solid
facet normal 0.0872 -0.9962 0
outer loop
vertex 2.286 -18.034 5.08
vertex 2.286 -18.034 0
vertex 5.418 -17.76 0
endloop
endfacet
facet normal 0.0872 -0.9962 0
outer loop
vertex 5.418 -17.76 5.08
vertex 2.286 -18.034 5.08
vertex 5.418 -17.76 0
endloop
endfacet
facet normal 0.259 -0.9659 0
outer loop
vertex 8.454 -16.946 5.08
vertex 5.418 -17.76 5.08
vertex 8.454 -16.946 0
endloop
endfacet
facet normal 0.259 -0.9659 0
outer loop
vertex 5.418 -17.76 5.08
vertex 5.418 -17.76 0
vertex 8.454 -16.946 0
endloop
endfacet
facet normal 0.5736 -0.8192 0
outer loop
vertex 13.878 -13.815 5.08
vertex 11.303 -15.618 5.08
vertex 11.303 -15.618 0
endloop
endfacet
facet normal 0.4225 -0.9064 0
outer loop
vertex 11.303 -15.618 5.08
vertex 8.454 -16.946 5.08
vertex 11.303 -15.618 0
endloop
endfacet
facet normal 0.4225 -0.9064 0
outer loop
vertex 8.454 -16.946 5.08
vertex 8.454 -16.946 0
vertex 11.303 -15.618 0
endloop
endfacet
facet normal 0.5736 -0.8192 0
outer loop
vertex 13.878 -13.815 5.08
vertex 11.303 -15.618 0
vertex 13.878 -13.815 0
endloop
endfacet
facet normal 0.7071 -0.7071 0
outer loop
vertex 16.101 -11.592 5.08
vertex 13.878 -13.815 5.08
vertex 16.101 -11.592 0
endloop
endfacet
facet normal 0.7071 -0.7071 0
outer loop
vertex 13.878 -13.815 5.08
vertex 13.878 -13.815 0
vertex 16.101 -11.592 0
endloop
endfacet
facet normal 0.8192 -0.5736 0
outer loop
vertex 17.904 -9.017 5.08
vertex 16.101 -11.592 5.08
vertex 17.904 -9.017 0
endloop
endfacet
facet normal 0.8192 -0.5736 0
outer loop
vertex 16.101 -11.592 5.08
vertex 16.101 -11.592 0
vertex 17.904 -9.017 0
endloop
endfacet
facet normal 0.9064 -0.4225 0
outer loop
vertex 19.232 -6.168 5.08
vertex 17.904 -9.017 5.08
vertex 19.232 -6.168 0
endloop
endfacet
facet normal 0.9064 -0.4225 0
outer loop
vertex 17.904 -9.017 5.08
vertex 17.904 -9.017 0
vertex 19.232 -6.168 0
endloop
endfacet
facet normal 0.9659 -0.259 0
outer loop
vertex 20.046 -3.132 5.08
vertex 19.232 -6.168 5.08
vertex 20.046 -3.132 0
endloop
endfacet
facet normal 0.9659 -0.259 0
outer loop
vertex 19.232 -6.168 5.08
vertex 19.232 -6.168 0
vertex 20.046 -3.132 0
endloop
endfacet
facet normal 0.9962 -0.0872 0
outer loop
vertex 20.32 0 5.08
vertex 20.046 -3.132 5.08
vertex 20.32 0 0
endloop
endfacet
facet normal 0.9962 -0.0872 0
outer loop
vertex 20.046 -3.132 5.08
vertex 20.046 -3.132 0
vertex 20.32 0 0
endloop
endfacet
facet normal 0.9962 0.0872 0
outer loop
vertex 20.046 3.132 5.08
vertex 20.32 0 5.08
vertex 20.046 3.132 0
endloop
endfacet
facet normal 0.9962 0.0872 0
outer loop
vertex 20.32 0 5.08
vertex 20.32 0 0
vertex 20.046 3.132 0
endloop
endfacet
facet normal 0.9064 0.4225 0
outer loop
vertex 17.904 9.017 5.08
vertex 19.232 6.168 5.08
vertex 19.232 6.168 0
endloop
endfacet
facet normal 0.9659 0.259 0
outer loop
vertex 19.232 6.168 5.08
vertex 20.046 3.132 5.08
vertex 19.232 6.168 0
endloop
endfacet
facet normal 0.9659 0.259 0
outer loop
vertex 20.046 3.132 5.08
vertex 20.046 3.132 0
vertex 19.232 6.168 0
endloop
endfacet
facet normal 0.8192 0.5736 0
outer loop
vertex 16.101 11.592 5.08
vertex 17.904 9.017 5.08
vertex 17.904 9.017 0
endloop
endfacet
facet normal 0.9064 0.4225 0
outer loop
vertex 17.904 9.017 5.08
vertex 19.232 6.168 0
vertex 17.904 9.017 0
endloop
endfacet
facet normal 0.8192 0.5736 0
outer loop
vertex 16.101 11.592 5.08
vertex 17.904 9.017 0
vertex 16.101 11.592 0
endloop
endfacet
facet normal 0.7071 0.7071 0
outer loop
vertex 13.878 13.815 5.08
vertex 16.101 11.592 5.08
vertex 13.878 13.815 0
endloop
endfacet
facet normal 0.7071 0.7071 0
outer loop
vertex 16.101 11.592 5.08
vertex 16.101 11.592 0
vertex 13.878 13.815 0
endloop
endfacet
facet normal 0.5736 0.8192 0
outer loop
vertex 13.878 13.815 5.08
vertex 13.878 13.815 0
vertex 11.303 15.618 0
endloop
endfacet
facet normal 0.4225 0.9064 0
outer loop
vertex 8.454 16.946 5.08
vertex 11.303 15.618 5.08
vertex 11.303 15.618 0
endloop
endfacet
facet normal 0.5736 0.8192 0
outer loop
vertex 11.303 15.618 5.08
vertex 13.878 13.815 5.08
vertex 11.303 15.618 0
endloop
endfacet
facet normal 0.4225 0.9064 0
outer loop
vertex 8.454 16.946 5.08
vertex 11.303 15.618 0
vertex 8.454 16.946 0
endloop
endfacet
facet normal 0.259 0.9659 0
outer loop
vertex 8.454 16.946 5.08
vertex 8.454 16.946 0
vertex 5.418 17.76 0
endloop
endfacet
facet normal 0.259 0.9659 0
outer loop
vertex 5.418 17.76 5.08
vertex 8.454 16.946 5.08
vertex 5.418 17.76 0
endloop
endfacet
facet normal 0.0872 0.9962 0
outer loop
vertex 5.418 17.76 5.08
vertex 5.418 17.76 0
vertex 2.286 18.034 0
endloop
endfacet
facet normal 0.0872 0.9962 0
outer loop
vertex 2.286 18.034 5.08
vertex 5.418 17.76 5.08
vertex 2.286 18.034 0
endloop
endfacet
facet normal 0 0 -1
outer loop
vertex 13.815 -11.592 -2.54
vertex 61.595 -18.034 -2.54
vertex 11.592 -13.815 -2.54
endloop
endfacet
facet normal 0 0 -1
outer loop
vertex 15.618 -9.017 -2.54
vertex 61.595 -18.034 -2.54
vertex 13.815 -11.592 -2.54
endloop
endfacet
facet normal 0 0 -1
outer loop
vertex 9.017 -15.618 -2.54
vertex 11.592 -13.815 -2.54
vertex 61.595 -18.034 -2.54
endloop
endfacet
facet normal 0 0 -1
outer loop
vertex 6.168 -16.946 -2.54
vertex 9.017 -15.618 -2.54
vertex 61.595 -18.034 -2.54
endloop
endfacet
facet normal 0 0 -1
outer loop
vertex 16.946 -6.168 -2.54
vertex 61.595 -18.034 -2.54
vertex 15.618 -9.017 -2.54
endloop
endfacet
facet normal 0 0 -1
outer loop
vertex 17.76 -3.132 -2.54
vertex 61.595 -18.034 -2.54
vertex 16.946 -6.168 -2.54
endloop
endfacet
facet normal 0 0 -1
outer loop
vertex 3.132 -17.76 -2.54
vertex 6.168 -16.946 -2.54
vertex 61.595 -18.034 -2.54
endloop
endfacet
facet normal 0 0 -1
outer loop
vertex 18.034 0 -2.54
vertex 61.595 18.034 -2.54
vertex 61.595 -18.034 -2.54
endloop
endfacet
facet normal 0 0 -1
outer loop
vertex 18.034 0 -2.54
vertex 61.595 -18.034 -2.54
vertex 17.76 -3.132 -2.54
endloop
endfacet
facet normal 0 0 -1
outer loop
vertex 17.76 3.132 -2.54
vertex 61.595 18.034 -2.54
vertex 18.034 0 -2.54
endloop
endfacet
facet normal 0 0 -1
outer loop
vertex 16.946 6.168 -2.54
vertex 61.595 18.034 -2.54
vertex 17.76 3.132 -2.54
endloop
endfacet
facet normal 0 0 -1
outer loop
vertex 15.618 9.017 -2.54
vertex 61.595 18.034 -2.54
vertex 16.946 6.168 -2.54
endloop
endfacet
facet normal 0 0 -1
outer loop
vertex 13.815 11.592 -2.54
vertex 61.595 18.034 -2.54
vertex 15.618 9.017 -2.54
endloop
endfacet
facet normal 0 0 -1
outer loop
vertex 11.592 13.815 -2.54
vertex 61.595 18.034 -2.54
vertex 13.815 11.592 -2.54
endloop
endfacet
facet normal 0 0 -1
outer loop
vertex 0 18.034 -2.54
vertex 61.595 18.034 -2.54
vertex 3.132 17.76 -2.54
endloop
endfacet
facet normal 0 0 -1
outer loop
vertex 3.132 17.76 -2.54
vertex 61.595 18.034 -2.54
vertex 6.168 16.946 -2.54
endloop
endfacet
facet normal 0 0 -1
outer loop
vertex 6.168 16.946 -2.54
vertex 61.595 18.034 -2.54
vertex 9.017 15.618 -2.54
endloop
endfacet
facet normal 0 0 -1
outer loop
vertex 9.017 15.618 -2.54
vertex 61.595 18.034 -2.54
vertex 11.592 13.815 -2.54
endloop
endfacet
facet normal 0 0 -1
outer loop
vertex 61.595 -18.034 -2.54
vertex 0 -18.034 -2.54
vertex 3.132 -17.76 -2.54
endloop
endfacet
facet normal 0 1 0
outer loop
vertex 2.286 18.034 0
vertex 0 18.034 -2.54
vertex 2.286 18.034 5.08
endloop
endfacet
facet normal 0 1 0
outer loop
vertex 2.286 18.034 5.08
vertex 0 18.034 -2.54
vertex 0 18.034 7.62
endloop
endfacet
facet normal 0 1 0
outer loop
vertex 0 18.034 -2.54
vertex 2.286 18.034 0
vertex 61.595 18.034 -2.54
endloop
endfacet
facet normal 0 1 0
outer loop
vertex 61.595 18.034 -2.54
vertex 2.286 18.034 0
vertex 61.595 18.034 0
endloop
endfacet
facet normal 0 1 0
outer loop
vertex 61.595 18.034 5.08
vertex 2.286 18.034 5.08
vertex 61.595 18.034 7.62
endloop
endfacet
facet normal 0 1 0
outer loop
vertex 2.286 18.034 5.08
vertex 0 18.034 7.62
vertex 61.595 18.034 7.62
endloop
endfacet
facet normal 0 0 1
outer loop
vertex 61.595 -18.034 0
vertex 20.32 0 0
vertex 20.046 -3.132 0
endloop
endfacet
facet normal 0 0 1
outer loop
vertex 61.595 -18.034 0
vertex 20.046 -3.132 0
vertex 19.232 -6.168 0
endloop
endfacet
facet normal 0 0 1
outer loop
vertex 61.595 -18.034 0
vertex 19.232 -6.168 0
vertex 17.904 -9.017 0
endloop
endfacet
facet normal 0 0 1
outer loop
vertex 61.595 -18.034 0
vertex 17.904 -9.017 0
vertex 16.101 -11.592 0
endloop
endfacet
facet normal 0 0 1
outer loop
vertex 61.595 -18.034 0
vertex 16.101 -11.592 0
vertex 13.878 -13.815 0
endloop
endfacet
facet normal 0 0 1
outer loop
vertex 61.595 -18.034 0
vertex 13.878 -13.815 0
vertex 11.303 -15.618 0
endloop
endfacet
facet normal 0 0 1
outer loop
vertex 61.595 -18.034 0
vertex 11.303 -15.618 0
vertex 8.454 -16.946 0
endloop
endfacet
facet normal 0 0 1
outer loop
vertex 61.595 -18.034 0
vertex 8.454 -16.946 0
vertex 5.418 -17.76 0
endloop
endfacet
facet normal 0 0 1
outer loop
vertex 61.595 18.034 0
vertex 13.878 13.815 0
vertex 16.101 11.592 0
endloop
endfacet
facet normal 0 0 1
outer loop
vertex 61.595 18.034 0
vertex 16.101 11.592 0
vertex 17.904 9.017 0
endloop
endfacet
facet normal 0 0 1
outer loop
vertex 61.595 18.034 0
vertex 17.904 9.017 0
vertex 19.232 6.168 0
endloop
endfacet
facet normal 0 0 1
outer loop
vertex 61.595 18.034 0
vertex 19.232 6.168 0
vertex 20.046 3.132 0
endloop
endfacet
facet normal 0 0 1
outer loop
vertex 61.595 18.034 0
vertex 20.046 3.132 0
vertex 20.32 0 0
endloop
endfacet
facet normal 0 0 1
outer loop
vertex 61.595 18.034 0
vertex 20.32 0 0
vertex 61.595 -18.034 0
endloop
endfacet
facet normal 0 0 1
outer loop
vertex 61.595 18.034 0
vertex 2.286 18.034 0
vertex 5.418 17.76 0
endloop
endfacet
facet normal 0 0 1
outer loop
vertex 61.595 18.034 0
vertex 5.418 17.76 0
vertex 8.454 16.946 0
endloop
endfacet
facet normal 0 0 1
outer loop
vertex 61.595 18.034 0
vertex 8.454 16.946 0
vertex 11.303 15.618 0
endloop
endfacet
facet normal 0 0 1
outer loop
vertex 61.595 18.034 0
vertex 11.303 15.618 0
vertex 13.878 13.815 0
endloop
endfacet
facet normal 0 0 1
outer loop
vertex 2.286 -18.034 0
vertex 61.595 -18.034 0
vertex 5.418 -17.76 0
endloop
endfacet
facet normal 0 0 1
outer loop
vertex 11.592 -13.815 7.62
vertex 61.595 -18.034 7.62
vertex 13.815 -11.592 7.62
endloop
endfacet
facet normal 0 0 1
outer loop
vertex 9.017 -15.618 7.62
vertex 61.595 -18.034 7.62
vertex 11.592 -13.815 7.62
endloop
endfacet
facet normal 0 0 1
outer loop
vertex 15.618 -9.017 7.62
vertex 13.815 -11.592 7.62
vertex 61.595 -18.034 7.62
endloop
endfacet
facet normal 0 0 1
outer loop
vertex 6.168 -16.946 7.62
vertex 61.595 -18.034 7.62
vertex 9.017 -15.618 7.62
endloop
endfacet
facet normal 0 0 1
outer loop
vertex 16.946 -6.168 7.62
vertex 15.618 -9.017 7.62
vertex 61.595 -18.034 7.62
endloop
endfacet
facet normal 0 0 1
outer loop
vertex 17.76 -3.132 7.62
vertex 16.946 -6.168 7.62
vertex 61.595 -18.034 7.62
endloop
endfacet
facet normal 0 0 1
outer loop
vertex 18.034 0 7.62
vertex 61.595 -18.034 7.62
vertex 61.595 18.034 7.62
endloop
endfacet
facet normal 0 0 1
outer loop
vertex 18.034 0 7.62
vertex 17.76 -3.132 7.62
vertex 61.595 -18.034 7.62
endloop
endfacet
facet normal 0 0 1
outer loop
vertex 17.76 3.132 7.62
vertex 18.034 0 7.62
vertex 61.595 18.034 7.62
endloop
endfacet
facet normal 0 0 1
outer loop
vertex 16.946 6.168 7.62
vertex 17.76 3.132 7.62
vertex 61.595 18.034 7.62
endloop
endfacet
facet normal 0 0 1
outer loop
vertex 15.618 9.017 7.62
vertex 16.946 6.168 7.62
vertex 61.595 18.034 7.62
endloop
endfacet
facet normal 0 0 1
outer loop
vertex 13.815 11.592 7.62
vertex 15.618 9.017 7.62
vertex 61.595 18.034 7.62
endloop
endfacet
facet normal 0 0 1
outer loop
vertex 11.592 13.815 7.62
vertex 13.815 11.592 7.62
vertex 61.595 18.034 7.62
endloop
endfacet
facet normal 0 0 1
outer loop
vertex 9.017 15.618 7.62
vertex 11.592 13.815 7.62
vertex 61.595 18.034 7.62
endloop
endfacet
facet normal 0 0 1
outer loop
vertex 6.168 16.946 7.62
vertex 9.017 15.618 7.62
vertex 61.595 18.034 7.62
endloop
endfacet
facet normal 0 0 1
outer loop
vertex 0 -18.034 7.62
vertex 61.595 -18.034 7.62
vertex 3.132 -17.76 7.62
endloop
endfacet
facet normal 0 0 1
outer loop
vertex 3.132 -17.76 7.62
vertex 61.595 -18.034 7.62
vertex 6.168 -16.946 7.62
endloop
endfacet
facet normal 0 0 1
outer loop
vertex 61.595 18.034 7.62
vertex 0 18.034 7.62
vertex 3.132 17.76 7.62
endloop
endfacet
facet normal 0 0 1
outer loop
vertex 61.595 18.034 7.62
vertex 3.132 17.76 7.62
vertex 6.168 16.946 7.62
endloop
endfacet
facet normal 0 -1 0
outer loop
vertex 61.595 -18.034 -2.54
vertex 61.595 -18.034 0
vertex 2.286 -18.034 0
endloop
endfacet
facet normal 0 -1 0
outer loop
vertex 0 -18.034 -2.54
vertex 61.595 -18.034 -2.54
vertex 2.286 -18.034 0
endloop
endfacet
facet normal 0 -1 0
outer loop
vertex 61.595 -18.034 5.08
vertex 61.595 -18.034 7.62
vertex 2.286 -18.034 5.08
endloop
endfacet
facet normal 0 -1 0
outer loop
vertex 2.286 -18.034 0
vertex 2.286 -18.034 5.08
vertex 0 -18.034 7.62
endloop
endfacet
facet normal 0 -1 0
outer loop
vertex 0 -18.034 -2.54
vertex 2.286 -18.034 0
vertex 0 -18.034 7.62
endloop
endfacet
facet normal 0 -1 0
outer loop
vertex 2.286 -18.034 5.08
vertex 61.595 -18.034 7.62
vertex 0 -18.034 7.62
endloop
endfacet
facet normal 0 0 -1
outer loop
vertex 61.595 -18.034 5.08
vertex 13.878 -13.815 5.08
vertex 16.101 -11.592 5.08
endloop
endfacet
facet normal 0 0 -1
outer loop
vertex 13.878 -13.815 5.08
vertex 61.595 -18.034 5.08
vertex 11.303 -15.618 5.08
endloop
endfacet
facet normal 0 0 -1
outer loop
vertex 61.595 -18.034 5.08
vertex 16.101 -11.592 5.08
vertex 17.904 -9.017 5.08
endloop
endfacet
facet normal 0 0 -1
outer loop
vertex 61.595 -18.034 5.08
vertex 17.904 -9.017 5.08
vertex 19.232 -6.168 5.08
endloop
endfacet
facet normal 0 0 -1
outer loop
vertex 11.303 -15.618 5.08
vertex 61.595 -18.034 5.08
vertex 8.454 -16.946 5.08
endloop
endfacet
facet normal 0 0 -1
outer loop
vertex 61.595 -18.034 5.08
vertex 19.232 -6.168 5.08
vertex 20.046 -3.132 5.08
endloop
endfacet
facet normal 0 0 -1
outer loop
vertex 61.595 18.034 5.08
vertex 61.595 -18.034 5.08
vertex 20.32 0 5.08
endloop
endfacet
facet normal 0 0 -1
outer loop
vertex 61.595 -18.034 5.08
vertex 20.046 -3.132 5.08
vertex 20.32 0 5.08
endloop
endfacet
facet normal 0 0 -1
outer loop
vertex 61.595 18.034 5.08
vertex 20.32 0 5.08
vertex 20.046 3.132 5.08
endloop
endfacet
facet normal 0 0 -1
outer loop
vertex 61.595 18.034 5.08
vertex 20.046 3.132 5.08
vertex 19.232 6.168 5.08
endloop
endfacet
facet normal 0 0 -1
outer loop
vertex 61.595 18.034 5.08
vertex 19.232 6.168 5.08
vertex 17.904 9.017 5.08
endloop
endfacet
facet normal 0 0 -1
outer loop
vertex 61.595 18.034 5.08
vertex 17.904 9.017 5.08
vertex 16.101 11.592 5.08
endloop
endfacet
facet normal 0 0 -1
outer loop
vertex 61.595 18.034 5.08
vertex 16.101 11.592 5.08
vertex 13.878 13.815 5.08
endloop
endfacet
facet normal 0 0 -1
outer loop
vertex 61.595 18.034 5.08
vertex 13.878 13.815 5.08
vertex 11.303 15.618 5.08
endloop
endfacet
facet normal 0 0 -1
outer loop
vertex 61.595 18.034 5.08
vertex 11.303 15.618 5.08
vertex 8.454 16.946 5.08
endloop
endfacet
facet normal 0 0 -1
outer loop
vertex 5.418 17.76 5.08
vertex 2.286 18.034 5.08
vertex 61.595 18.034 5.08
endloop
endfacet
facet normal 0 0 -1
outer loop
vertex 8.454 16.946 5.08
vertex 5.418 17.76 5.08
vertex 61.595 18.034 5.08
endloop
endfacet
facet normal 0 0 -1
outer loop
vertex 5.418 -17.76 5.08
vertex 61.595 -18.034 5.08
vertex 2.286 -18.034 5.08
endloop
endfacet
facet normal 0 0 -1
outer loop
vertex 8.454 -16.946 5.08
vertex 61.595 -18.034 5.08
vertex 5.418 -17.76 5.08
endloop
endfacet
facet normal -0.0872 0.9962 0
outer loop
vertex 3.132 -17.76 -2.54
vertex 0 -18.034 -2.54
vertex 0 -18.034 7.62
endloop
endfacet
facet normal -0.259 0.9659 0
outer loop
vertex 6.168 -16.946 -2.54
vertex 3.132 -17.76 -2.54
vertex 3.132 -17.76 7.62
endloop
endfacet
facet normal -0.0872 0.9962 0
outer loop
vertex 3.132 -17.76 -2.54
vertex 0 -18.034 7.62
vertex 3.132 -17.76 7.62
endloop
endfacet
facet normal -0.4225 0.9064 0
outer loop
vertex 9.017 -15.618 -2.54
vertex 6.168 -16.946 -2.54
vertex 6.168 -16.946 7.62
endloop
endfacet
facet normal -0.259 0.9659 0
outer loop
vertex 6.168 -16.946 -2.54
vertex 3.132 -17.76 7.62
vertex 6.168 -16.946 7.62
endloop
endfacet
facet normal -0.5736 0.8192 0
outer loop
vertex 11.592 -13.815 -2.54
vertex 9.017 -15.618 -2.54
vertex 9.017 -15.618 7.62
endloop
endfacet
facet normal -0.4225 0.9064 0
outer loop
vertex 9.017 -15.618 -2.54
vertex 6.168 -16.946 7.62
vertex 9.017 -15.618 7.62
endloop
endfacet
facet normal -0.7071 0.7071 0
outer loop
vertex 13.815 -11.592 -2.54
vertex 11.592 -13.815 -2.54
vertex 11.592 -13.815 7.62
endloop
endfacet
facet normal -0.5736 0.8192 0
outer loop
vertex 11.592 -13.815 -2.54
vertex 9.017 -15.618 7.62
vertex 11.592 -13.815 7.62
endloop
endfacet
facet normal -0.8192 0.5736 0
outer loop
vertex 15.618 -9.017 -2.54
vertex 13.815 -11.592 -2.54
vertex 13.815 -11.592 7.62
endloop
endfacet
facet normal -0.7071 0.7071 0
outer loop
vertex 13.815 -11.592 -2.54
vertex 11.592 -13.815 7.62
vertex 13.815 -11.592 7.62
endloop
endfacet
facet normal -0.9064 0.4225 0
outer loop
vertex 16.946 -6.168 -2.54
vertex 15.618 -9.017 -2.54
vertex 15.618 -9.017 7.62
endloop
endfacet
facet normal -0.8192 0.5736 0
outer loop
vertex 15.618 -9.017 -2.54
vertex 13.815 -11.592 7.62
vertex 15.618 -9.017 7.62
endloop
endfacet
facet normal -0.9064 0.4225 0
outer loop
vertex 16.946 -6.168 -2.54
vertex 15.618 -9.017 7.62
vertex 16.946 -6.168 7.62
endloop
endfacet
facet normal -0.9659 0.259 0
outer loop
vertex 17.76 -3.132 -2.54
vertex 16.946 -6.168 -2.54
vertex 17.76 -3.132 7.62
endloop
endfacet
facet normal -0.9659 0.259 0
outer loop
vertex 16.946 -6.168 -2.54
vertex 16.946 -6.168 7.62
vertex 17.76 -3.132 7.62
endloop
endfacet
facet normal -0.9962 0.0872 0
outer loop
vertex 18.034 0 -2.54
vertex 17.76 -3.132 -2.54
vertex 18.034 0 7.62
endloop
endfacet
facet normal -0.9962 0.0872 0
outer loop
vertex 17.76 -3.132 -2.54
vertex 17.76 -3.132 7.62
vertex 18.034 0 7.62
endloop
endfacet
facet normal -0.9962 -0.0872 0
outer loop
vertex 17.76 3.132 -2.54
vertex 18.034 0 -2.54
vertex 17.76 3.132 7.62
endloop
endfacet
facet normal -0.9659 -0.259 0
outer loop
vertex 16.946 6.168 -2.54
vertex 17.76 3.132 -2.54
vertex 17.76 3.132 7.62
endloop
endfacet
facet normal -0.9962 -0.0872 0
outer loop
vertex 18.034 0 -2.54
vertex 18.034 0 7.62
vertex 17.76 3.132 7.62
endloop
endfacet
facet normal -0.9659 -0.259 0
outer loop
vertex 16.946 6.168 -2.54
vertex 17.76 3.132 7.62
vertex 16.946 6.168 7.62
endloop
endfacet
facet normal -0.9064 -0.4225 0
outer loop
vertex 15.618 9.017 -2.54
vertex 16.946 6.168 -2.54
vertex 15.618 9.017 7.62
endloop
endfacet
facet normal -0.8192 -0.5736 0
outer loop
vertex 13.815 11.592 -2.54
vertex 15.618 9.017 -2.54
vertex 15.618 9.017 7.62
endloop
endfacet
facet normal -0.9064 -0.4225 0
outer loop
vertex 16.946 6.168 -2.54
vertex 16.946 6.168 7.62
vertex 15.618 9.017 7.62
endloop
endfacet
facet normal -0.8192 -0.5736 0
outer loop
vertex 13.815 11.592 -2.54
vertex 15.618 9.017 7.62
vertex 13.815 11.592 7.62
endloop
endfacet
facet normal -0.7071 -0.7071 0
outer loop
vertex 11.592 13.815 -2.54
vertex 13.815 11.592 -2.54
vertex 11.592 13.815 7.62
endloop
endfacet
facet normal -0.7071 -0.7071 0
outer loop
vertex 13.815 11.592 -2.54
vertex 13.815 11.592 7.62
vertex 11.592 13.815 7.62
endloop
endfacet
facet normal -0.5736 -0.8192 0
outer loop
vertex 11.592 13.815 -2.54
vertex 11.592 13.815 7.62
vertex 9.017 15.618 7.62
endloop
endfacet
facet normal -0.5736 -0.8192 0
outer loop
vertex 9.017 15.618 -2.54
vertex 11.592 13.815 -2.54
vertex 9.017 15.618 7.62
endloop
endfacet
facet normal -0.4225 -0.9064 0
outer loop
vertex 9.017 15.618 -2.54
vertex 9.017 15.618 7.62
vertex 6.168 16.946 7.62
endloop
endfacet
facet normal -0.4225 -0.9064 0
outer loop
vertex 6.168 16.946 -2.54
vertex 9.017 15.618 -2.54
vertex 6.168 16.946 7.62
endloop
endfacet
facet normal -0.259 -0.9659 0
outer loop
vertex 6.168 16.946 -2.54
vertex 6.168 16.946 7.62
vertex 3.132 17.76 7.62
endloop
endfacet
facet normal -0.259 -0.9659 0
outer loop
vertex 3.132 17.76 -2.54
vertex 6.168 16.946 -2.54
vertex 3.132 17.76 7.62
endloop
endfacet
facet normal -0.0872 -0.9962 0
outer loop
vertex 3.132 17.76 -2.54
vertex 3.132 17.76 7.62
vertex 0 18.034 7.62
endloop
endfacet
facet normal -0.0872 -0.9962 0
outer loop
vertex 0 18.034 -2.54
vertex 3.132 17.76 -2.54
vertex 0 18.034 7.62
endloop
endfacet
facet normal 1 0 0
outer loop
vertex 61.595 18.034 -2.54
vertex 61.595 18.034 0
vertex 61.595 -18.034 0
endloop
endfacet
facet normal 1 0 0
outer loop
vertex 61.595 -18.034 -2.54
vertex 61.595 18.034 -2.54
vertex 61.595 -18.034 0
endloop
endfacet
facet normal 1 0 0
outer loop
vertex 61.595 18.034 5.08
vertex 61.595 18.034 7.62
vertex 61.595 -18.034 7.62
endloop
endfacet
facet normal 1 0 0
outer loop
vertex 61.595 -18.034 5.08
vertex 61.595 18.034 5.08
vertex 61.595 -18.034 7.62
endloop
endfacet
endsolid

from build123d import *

# Parameters (mm, degrees)
SKETCH1_R               = 19.939
CIRCLE_EXTRUDE_DEPTH    = 7.62
SKETCH3_W               = 7.62
SKETCH3_H               = 39.878
RECTANGLE_EXTRUDE_DEPTH = 63.5
SKETCH2_R               = 18.034
CRICLE_CUT_DEPTH        = 67.991627245
SKETCH4_OUTSIDE_W       = 103.997
SKETCH4_OUTSIDE_H       = 60.436
SKETCH4_OUTSIDE_W_2     = 61.595
SKETCH4_OUTSIDE_H_2     = 36.068
FRAME_CUT_DEPTH         = 67.991627245
EXTENSION_DEPTH         = 2.54
SKETCH11_W              = 5.08
SKETCH11_H              = 36.068
MIDDLE_DEPTH            = 46.682766784
SKETCH12_OUTSIDE_W      = 78.015
SKETCH12_OUTSIDE_H      = 52.488
CIRCLE_EXTENSION_DEPTH  = 5.08


with BuildPart() as part:
    # Sketch1 → circle extrude (new body)
    with BuildSketch(Plane.XY):
        with Locations(Location((0, 0, 0), (0, 0, 180))):
            Circle(SKETCH1_R)
    extrude(amount=CIRCLE_EXTRUDE_DEPTH)

    # Sketch3 → rectangle extrude (add)
    with BuildSketch(Plane(origin=(0, 0, 0), x_dir=(0, 0, -1), z_dir=(1, 0, 0))):
        with Locations((-3.81, 0)):
            Rectangle(SKETCH3_W, SKETCH3_H)
    extrude(amount=RECTANGLE_EXTRUDE_DEPTH)

    # Sketch2 → cricle cut (cut, through all)
    with BuildSketch(Plane.XY.offset(7.62)):
        Circle(SKETCH2_R)
    extrude(amount=-CRICLE_CUT_DEPTH, mode=Mode.SUBTRACT)

    # Sketch4 outside → frame cut (cut, through all)
    with BuildSketch(Plane.XY.offset(7.62)):
        with Locations((21.7805, 0)):
            Rectangle(SKETCH4_OUTSIDE_W, SKETCH4_OUTSIDE_H)
        with Locations((30.7975, 0)):
            Rectangle(SKETCH4_OUTSIDE_W_2, SKETCH4_OUTSIDE_H_2, mode=Mode.SUBTRACT)
    extrude(amount=-FRAME_CUT_DEPTH, mode=Mode.SUBTRACT)

    # Sketch10 → extension (add)
    with BuildSketch(Plane(origin=(0, 0, 0), x_dir=(-1, 0, 0), z_dir=(0, 0, -1))):
        with BuildLine():
            Line((0, 18.034), (-61.595, 18.034))
            Line((-61.595, 18.034), (-61.595, -18.034))
            Line((-61.595, -18.034), (0, -18.034))
            ThreePointArc((0, -18.034), (-18.034, 0), (0, 18.034))
        make_face()
    extrude(amount=EXTENSION_DEPTH)

    # Sketch11 → middle (cut, through all)
    with BuildSketch(Plane(origin=(20.32, 0, 0), x_dir=(0, 0, -1), z_dir=(1, 0, 0))):
        with Locations((-2.54, 0)):
            Rectangle(SKETCH11_W, SKETCH11_H)
    extrude(amount=MIDDLE_DEPTH, mode=Mode.SUBTRACT)

    # Sketch12 outside → circle extension (cut)
    with BuildSketch(Plane.XY):
        with Locations((30.7975, 0)):
            Rectangle(SKETCH12_OUTSIDE_W, SKETCH12_OUTSIDE_H)
        with BuildLine():
            Line((2.286, 18.034), (0, 18.034))
            Line((0, 18.034), (0, -18.034))
            Line((0, -18.034), (2.286, -18.034))
            ThreePointArc((2.286, -18.034), (20.32, 0), (2.286, 18.034))
        make_face(mode=Mode.SUBTRACT)
    extrude(amount=CIRCLE_EXTENSION_DEPTH, mode=Mode.SUBTRACT)


solid = part.part
